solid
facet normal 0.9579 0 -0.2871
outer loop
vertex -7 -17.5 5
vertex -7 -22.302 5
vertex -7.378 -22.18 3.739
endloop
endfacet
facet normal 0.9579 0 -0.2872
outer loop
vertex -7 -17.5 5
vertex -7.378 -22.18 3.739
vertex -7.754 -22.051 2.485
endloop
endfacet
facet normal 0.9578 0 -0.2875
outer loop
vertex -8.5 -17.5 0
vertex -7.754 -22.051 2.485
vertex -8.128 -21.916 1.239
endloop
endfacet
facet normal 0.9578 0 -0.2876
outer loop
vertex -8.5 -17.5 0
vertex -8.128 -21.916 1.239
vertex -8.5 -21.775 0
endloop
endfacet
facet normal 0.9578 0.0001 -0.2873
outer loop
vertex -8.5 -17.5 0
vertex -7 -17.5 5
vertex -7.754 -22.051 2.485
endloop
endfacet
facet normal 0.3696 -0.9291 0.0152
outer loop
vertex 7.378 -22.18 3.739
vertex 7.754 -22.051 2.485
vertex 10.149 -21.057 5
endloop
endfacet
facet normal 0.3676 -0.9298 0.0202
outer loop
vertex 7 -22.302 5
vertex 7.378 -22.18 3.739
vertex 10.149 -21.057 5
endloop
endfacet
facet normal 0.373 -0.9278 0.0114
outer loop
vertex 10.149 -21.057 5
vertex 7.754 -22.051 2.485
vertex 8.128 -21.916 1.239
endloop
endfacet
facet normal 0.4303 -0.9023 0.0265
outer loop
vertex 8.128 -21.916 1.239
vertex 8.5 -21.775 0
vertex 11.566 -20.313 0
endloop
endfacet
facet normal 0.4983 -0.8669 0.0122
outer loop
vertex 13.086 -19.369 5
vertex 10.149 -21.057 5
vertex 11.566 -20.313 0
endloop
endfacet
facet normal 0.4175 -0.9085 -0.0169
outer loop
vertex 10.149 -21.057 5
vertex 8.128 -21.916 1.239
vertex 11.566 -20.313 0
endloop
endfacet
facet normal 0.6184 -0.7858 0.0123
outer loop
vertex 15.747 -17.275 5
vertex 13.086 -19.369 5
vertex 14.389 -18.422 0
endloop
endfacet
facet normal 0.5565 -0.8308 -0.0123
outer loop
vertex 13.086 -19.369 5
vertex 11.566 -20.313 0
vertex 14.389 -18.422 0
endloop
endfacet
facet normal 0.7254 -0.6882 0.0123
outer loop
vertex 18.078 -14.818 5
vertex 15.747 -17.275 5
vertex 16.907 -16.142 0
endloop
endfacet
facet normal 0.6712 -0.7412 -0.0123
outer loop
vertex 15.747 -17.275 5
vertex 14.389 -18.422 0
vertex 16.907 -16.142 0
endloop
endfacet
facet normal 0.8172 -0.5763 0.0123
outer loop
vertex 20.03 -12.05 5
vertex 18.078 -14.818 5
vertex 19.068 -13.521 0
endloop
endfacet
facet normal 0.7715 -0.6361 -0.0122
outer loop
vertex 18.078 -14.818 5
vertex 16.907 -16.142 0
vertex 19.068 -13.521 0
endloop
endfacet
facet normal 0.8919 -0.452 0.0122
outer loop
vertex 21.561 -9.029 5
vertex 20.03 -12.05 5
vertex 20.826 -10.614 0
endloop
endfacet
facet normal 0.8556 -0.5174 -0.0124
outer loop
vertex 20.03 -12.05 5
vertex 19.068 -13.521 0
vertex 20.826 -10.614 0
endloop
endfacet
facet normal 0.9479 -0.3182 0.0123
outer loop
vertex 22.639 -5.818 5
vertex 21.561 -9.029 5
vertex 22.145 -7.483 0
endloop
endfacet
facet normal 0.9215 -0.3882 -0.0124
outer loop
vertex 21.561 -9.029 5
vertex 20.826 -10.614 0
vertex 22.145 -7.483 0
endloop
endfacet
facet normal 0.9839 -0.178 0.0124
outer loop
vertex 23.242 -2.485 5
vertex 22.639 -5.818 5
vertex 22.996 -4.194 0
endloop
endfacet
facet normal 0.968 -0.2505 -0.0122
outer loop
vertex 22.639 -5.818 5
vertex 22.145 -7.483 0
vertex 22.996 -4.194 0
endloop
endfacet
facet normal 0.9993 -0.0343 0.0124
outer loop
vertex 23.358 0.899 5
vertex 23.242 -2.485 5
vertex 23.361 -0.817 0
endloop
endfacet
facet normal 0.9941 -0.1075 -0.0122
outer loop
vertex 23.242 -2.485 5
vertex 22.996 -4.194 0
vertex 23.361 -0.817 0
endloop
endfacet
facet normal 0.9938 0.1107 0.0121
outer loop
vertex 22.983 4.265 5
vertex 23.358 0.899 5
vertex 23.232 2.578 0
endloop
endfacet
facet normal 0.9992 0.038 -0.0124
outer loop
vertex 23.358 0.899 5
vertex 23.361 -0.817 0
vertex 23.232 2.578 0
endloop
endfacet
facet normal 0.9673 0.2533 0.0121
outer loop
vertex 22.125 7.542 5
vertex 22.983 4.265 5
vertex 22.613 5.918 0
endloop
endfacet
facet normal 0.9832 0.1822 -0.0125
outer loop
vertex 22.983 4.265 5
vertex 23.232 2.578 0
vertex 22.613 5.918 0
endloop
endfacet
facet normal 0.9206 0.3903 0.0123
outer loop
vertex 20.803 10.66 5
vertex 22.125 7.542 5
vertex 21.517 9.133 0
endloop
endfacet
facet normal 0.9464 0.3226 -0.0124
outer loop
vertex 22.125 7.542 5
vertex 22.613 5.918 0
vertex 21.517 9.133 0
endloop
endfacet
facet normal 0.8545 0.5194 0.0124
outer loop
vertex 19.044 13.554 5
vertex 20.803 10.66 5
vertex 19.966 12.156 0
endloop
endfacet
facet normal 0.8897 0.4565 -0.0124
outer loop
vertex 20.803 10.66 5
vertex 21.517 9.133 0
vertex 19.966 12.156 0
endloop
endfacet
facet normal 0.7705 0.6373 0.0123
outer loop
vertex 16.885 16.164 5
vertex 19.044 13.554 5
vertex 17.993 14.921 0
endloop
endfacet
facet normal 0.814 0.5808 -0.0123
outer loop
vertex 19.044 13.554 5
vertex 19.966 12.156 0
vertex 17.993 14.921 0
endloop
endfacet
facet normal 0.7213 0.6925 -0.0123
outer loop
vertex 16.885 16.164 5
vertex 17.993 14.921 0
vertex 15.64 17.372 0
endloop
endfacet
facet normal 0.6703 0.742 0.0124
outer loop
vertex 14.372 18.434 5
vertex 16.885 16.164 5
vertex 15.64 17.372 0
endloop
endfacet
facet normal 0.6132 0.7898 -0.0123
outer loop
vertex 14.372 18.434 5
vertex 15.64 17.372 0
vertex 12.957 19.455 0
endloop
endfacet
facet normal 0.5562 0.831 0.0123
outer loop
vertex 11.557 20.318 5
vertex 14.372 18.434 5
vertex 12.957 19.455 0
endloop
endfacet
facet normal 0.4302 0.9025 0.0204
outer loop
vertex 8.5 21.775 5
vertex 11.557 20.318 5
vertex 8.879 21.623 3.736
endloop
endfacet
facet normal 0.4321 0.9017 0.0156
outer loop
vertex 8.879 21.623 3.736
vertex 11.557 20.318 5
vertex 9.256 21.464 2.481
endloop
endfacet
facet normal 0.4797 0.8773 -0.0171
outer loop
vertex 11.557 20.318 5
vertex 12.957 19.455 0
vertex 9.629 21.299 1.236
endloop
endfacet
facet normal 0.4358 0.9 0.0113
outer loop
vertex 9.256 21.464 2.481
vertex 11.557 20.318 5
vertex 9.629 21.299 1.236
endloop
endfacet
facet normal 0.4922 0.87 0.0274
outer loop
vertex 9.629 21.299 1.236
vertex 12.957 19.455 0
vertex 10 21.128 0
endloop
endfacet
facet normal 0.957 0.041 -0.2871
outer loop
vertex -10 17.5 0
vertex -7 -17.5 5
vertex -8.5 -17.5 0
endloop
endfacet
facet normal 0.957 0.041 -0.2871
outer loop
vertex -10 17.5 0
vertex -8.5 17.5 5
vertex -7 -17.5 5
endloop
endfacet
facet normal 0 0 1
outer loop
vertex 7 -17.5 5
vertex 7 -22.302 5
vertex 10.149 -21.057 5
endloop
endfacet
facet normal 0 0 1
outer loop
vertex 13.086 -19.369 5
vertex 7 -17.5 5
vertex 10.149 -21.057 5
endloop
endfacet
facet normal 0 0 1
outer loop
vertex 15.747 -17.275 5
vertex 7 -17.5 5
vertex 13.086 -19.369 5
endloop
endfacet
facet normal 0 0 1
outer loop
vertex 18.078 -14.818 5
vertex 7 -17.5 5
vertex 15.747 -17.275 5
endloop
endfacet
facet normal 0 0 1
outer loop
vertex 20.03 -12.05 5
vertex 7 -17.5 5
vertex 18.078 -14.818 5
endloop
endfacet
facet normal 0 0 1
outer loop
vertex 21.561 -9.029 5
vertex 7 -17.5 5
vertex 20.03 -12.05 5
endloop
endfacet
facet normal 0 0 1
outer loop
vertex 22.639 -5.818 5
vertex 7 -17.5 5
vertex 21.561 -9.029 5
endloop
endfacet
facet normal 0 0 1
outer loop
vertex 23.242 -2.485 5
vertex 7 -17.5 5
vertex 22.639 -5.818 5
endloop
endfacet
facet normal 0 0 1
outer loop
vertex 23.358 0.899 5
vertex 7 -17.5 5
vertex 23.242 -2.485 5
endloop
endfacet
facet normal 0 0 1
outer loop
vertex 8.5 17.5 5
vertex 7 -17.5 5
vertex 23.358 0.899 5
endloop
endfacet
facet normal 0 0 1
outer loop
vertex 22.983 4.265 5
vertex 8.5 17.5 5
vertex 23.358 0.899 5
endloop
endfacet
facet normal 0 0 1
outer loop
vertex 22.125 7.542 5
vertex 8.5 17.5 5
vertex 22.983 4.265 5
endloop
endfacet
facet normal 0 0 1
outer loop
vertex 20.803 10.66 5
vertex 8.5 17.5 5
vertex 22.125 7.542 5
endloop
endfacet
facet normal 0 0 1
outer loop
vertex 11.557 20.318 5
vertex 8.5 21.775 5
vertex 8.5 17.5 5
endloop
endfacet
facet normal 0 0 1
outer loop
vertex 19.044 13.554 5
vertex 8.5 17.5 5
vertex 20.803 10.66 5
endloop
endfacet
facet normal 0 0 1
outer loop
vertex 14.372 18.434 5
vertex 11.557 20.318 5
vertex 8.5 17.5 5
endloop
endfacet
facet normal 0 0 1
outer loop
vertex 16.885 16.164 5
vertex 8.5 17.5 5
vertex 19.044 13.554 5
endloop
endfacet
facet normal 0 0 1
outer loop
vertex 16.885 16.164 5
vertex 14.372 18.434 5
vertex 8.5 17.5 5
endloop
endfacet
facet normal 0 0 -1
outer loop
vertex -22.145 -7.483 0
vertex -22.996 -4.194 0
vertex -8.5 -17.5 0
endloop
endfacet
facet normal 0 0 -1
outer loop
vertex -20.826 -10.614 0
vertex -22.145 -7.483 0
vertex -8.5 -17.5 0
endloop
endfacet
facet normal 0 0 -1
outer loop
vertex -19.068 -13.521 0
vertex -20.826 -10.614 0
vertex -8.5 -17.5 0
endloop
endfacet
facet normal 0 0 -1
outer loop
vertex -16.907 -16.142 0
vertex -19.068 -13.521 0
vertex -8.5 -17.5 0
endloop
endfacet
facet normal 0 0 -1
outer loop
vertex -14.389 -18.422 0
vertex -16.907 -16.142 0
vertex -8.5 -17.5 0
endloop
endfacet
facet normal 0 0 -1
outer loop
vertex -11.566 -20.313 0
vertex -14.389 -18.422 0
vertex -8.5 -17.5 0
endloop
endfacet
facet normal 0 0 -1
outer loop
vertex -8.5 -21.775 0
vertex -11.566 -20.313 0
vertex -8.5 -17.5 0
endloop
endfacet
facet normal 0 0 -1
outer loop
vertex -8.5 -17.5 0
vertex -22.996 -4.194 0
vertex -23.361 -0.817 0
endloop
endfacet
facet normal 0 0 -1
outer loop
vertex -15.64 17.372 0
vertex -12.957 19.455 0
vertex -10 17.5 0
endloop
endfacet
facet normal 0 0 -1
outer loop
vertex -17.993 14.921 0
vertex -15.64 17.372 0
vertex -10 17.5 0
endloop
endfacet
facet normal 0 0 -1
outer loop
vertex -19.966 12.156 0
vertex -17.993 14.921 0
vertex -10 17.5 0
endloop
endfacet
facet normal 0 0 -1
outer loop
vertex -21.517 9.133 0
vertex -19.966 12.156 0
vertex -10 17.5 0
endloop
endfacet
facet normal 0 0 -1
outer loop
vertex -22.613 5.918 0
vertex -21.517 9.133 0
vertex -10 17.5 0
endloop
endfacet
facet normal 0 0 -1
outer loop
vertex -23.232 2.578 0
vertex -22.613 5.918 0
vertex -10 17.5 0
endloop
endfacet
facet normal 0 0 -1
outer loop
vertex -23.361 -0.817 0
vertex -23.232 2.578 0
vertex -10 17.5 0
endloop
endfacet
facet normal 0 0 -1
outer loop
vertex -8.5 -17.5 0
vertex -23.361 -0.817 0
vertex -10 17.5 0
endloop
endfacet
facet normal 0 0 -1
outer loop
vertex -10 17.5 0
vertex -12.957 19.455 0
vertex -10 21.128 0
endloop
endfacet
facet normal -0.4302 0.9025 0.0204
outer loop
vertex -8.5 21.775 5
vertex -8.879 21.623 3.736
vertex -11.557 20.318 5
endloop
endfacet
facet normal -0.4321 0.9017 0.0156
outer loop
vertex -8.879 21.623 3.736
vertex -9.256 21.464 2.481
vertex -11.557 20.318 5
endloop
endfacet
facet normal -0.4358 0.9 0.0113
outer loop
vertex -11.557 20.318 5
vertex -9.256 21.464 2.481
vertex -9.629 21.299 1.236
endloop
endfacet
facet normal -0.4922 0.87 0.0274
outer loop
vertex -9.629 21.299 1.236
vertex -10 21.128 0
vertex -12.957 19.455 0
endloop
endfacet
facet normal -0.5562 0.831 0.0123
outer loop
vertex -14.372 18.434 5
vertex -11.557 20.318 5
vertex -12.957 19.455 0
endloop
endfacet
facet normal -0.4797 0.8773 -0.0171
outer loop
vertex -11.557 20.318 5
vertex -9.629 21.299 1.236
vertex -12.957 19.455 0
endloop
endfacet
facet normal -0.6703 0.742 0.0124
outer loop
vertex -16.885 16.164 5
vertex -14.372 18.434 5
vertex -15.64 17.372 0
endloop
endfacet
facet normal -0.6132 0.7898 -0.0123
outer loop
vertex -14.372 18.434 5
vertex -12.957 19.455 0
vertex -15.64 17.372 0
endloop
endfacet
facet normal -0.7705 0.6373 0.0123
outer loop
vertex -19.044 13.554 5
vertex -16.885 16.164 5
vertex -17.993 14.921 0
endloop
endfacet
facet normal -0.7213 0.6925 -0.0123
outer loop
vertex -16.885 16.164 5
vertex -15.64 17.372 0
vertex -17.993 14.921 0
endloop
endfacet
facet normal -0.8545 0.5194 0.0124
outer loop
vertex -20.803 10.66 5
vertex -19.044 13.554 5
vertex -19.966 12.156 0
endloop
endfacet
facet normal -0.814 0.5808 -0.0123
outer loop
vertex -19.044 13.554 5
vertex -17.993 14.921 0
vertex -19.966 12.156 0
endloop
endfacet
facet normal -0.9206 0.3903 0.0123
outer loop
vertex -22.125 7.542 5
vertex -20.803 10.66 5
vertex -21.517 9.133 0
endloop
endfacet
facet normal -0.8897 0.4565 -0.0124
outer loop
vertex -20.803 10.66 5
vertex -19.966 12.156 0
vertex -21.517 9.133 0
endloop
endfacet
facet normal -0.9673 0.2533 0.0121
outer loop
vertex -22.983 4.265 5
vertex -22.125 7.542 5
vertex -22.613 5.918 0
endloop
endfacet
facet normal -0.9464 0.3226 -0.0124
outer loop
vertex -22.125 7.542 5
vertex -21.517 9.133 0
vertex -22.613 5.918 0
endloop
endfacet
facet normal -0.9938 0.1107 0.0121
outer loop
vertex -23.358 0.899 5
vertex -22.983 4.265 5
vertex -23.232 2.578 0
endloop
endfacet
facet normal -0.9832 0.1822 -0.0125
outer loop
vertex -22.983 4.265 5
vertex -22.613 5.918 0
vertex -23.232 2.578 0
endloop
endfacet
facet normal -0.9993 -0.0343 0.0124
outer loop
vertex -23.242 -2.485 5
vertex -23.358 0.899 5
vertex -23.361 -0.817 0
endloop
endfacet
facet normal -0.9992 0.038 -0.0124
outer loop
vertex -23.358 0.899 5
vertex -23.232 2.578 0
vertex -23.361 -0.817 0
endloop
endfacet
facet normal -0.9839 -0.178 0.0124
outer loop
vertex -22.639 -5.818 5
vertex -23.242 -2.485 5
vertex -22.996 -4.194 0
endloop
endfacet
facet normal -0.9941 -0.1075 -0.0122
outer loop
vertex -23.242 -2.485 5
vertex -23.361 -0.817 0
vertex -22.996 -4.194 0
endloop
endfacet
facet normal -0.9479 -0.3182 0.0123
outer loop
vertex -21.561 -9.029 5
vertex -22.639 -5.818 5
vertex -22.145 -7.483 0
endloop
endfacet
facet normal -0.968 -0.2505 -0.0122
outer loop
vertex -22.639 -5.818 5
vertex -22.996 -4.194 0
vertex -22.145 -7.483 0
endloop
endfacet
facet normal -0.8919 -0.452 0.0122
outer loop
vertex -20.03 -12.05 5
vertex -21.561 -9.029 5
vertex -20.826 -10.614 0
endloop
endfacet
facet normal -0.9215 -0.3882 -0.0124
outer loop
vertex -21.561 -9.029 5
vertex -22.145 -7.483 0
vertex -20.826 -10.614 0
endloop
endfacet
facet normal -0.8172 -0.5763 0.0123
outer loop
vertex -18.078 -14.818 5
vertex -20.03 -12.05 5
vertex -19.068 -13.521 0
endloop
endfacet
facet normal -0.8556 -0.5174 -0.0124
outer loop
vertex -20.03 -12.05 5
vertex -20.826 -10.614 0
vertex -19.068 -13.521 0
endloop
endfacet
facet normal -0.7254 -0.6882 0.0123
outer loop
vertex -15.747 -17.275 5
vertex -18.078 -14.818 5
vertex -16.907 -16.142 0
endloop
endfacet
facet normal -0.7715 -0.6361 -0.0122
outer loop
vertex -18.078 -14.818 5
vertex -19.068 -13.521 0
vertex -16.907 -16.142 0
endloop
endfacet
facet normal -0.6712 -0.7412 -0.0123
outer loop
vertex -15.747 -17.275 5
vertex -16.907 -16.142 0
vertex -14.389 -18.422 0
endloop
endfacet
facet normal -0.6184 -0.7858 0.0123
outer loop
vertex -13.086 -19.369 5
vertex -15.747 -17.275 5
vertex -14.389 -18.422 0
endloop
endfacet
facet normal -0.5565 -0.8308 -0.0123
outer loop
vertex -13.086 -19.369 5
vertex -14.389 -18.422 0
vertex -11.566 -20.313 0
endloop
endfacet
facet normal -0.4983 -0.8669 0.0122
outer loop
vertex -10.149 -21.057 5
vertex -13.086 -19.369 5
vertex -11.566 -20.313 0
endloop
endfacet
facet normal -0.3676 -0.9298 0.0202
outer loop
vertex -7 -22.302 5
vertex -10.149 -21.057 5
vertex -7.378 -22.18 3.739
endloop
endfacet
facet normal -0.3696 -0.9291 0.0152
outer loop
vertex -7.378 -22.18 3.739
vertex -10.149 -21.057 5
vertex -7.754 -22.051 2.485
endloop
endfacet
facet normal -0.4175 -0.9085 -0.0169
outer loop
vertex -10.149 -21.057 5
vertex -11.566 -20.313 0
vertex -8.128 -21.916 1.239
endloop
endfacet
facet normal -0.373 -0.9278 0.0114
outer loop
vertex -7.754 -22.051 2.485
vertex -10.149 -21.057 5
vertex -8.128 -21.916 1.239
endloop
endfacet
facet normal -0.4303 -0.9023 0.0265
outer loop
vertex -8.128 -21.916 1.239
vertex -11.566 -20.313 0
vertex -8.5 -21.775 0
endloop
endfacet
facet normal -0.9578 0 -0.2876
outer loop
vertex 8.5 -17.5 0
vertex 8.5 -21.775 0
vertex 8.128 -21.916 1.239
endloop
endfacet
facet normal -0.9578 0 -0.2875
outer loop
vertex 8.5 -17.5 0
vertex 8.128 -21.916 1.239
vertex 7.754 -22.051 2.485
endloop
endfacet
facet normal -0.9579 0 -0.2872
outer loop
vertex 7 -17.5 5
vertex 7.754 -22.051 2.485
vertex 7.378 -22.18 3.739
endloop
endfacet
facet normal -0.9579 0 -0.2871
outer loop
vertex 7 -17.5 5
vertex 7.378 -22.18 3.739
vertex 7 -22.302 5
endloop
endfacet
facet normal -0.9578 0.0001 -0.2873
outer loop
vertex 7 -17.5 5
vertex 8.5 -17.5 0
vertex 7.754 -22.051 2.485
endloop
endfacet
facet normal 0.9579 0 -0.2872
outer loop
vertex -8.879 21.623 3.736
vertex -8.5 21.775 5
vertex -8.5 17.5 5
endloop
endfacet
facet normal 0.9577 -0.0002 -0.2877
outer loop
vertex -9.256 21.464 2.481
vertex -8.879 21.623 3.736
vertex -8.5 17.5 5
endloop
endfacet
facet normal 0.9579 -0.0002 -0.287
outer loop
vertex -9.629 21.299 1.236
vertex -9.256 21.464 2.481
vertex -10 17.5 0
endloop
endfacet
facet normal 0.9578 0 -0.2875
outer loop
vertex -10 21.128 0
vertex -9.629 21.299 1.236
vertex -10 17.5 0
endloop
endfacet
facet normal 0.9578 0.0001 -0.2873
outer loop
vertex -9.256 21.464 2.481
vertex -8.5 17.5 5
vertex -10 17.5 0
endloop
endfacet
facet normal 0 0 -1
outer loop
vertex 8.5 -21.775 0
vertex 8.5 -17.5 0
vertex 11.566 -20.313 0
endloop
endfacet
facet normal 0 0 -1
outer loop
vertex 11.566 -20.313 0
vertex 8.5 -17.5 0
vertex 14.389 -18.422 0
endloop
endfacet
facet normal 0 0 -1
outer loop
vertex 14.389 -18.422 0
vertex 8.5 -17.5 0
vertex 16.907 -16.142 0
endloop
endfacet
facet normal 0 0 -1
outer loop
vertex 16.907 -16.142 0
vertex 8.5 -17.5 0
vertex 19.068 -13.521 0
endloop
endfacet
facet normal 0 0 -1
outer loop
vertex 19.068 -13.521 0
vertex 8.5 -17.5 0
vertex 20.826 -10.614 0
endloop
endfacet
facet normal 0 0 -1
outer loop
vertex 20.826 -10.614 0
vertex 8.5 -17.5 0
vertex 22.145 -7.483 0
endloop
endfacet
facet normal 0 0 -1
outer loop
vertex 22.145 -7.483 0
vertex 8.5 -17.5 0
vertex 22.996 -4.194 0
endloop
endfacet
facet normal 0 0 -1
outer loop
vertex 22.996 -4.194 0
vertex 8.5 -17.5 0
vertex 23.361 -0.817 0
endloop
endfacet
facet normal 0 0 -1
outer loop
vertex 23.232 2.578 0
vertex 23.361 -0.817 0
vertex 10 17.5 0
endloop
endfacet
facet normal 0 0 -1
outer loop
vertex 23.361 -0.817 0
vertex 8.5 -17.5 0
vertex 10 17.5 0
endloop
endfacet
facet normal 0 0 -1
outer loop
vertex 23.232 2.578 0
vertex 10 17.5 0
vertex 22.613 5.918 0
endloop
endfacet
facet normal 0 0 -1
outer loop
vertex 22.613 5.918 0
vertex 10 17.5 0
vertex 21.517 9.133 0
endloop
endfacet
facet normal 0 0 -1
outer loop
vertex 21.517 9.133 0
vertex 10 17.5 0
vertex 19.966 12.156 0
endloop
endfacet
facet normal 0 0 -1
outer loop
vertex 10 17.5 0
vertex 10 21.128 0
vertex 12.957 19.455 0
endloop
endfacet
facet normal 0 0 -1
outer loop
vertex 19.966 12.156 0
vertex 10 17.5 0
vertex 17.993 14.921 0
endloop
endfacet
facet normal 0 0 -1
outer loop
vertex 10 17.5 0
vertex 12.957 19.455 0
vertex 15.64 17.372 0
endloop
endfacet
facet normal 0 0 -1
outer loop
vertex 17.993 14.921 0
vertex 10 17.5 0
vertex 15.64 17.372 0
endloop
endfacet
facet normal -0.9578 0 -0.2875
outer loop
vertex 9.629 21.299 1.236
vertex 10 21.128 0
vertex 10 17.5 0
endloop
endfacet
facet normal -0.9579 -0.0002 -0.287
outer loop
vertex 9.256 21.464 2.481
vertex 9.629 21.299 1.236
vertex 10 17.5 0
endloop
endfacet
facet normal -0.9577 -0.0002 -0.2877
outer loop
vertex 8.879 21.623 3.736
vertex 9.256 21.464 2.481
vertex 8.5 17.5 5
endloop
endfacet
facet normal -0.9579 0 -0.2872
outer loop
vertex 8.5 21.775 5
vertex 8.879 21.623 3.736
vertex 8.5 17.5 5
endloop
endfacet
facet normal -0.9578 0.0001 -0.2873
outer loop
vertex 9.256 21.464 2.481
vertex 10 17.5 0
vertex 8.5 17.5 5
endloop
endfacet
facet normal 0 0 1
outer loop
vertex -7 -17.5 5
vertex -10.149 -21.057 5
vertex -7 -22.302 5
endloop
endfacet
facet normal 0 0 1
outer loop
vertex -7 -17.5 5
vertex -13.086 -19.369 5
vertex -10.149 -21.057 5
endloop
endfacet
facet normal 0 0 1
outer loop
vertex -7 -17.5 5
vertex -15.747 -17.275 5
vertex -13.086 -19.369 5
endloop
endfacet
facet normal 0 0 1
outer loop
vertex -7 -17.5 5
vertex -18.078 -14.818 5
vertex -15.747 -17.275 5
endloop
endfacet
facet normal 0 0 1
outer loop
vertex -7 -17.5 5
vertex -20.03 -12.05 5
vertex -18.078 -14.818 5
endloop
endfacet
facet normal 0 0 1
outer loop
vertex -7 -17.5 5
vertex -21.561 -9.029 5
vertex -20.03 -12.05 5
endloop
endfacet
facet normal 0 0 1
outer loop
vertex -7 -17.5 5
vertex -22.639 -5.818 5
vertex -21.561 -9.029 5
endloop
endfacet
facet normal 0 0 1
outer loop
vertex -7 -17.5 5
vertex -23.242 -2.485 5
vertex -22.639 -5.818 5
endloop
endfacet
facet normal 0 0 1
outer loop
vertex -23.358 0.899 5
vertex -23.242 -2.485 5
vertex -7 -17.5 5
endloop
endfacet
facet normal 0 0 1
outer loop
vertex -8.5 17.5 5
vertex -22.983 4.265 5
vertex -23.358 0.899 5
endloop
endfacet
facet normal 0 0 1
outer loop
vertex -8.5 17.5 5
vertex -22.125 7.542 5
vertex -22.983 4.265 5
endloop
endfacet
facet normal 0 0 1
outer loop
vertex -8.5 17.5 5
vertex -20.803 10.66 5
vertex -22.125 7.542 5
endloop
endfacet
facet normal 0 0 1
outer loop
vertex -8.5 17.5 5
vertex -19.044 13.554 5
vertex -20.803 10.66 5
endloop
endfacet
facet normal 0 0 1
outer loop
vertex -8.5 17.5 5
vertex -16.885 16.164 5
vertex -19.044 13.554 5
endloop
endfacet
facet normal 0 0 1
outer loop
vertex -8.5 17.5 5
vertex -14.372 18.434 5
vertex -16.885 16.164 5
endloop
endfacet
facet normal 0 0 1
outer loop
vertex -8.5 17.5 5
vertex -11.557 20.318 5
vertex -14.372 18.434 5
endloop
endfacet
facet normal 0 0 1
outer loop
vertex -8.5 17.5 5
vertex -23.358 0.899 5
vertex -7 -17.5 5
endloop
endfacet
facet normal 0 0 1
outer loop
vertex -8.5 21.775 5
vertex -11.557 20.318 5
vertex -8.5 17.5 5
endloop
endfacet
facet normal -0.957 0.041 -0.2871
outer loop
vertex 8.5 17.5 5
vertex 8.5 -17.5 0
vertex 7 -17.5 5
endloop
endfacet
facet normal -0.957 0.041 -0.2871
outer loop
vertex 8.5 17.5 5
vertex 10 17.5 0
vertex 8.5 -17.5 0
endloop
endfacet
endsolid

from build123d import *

# Parameters (mm, degrees)
F0_R     = 23.375
F1_DEPTH = 5
F7_DEPTH = 25
F8_DEPTH = 25


with BuildPart() as f1:
    # F0 (on Top) → F1 (new body)
    with BuildSketch(Plane.XY):
        Circle(F0_R)
    extrude(amount=F1_DEPTH)

    # F4 (on offset) → F6 section 0
    with BuildSketch(Plane.XZ.offset(17.5)):
        Polygon((-7, 5), (-8.5, 0), (8.5, 0), (7, 5), align=None)
    # F5 (on offset) → F6 section 1
    with BuildSketch(Plane.XZ.offset(-17.5)):
        Polygon((-10, 0), (10, 0), (8.5, 5), (-8.5, 5), align=None)
    loft(mode=Mode.SUBTRACT)

    # F4 (on offset) → F7 (cut)
    with BuildSketch(Plane.XZ.offset(17.5)):
        Polygon((-7, 5), (-8.5, 0), (8.5, 0), (7, 5), align=None)
    extrude(amount=F7_DEPTH, mode=Mode.SUBTRACT)

    # F5 (on offset) → F8 (cut)
    with BuildSketch(Plane.XZ.offset(-17.5)):
        Polygon((-10, 0), (10, 0), (8.5, 5), (-8.5, 5), align=None)
    extrude(amount=-F8_DEPTH, mode=Mode.SUBTRACT)


solid = f1.part
